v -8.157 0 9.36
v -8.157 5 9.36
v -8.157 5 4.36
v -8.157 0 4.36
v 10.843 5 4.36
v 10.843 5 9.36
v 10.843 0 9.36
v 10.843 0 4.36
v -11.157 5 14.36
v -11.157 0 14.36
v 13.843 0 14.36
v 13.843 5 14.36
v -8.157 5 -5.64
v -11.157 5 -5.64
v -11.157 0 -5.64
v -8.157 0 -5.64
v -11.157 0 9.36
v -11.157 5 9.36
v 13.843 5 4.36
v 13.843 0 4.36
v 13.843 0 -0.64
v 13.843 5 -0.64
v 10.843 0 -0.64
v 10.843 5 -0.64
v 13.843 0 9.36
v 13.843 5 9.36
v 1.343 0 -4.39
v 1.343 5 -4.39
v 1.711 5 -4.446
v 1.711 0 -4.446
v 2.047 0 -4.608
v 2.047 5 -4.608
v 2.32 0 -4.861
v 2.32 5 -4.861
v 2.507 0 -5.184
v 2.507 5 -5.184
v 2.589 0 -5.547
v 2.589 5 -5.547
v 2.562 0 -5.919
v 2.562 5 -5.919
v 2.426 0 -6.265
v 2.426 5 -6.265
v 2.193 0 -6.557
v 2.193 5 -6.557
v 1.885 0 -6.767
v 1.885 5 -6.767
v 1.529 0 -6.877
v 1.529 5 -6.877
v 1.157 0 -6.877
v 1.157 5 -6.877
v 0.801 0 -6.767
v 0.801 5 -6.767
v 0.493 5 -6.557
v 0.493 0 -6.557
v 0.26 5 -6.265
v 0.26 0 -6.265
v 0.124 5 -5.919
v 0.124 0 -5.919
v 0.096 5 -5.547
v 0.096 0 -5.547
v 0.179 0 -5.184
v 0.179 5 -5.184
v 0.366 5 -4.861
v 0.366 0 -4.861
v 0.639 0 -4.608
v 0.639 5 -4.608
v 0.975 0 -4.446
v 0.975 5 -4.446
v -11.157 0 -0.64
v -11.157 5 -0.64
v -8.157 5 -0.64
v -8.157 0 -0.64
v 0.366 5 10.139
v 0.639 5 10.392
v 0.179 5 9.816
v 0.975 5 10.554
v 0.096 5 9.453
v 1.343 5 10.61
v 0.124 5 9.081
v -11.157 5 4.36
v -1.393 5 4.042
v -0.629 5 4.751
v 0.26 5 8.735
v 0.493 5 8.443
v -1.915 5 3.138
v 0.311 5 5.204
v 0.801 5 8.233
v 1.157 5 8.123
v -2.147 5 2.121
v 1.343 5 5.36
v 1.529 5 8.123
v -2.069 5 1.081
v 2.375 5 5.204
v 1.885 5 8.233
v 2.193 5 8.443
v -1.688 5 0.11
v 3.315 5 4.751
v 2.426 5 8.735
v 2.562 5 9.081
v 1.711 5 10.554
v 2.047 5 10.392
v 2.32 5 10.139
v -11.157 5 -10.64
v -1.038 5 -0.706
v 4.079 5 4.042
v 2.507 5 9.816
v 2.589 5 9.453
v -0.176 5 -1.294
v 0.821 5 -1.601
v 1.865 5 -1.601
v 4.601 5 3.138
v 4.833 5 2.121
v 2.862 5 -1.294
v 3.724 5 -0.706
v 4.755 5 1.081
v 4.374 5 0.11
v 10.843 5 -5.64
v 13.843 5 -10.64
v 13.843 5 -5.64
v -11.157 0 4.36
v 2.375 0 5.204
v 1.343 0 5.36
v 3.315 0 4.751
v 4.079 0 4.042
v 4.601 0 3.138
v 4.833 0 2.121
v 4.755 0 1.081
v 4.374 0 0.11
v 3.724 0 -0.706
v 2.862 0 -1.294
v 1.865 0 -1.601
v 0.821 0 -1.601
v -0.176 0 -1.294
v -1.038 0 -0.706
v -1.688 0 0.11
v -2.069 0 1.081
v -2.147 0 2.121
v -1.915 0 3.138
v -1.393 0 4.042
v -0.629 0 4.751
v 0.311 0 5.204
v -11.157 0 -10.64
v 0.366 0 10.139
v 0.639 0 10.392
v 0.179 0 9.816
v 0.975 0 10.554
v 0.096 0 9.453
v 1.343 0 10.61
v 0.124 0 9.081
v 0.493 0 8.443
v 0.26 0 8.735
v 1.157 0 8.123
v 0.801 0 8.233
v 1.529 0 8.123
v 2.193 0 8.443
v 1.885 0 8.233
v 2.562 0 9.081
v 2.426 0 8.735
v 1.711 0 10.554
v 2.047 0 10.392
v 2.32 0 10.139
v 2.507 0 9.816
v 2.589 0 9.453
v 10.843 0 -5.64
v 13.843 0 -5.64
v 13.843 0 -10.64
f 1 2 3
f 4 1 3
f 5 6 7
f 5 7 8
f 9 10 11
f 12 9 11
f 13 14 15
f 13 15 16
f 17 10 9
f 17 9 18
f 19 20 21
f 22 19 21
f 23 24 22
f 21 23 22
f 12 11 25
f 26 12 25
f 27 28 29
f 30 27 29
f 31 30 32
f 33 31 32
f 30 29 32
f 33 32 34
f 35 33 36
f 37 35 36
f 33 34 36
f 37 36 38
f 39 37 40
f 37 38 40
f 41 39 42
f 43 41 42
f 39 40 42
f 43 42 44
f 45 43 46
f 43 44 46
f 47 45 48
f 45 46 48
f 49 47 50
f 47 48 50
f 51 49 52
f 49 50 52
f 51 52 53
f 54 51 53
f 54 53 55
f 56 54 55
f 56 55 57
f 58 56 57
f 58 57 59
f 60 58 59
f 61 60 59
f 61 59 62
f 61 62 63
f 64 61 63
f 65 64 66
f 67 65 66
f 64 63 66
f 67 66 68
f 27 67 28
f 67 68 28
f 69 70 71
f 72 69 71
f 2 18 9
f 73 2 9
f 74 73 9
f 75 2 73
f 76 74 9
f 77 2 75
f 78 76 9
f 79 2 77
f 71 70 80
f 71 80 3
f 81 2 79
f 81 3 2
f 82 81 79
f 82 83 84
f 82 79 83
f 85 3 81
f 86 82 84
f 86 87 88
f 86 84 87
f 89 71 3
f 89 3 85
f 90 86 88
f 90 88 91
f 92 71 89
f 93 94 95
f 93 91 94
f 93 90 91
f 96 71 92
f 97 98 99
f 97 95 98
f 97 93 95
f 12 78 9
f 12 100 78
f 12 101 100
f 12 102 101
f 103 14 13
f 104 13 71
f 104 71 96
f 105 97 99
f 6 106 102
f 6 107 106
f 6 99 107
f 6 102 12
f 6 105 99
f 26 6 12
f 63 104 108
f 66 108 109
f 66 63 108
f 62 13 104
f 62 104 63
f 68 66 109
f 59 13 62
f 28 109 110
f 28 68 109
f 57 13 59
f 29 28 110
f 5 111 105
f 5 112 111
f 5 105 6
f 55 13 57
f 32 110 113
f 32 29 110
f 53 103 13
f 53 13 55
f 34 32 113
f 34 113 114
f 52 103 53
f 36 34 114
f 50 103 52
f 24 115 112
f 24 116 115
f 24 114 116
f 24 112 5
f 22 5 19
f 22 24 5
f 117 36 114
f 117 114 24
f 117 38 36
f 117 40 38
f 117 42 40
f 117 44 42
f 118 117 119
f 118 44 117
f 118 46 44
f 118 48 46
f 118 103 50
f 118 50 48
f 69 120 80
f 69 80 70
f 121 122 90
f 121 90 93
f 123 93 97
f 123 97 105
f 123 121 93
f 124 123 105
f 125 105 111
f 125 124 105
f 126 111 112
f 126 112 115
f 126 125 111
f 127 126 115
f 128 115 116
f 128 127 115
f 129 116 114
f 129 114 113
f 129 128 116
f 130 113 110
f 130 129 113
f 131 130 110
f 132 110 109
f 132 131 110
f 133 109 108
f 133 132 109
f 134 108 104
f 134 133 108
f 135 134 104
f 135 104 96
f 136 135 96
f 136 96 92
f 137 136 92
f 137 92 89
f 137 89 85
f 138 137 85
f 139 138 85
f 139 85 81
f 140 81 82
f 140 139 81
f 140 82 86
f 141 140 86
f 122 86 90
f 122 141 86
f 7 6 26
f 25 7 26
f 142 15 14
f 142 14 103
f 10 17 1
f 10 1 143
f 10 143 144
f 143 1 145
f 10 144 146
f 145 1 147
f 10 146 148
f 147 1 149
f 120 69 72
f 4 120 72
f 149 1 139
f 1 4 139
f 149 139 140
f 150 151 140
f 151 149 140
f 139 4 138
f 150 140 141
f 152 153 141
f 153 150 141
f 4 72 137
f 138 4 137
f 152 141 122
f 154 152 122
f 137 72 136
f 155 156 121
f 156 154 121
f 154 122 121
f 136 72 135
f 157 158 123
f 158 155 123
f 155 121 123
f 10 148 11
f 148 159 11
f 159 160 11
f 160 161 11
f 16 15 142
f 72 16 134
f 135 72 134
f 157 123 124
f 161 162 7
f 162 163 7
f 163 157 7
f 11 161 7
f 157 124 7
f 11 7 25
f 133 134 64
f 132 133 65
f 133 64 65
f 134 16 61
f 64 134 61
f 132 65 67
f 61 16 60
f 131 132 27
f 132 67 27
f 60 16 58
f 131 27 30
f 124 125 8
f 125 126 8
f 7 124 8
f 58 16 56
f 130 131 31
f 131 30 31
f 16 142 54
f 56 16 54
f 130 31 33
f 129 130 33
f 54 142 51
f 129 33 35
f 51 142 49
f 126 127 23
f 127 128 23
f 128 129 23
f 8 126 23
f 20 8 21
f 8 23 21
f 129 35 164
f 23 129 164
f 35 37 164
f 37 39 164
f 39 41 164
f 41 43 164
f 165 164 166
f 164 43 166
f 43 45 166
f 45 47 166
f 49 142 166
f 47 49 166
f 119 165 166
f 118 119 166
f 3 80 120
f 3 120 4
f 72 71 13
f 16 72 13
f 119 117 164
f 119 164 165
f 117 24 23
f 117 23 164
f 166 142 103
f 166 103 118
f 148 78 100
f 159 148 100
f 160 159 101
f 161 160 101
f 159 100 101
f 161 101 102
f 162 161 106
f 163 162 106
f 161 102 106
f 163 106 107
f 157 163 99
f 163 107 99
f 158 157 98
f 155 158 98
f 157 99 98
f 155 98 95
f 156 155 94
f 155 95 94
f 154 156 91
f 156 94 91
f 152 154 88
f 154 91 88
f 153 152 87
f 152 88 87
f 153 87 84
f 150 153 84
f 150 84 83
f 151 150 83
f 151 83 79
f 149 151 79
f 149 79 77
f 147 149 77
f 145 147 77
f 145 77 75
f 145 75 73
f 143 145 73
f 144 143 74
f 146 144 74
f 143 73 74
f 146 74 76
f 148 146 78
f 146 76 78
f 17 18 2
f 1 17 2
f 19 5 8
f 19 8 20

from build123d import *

# Parameters (mm, degrees)
SKETCH1_W           = 25
SKETCH1_H           = 25
SKETCH1_R           = 3.5
BOSS_EXTRUDE1_DEPTH = 5
SKETCH2_W           = 3
SKETCH2_H           = 5
CUT_EXTRUDE1_DEPTH  = 15
SKETCH3_R           = 1.25
SKETCH3_R_2         = 3.402319191
CUT_EXTRUDE2_DEPTH  = 5


with BuildPart() as part:
    # Sketch1 → Boss-Extrude1 (new body)
    with BuildSketch(Plane(origin=(0, 0, 0), x_dir=(1, 0, 0), z_dir=(0, 1, 0))):
        with Locations((1.342975207, -1.859504132)):
            Rectangle(SKETCH1_W, SKETCH1_H)
        with Locations(Location((1.342975207, -1.859504132, 0), (0, 0, 270))):
            Circle(SKETCH1_R, mode=Mode.SUBTRACT)
    extrude(amount=BOSS_EXTRUDE1_DEPTH)

    # Sketch2 → Cut-Extrude1 (cut)
    with BuildSketch(Plane(origin=(0, 5, 0), x_dir=(1, 0, 0), z_dir=(0, 1, 0))):
        with Locations((-9.657024793, 3.140495868)):
            Rectangle(SKETCH2_W, SKETCH2_H)
        with Locations((-9.657024793, -6.859504132)):
            Rectangle(SKETCH2_W, SKETCH2_H)
        with Locations((12.342975207, -6.859504132)):
            Rectangle(SKETCH2_W, SKETCH2_H)
        with Locations((12.342975207, 3.140495868)):
            Rectangle(SKETCH2_W, SKETCH2_H)
    extrude(amount=-CUT_EXTRUDE1_DEPTH, mode=Mode.SUBTRACT)

    # Sketch3 → Cut-Extrude2 (cut)
    with BuildSketch(Plane(origin=(0, 5, 0), x_dir=(1, 0, 0), z_dir=(0, 1, 0))):
        with Locations(Location((1.342975207, 5.640495868, 0), (0, 0, 270))):
            Circle(SKETCH3_R)
        with Locations(Location((1.342975207, -9.359504132, 0), (0, 0, 270))):
            Circle(SKETCH3_R)
        with Locations((1.342975207, -1.859504132)):
            Circle(SKETCH3_R_2)
    extrude(amount=-CUT_EXTRUDE2_DEPTH, mode=Mode.SUBTRACT)


solid = part.part
